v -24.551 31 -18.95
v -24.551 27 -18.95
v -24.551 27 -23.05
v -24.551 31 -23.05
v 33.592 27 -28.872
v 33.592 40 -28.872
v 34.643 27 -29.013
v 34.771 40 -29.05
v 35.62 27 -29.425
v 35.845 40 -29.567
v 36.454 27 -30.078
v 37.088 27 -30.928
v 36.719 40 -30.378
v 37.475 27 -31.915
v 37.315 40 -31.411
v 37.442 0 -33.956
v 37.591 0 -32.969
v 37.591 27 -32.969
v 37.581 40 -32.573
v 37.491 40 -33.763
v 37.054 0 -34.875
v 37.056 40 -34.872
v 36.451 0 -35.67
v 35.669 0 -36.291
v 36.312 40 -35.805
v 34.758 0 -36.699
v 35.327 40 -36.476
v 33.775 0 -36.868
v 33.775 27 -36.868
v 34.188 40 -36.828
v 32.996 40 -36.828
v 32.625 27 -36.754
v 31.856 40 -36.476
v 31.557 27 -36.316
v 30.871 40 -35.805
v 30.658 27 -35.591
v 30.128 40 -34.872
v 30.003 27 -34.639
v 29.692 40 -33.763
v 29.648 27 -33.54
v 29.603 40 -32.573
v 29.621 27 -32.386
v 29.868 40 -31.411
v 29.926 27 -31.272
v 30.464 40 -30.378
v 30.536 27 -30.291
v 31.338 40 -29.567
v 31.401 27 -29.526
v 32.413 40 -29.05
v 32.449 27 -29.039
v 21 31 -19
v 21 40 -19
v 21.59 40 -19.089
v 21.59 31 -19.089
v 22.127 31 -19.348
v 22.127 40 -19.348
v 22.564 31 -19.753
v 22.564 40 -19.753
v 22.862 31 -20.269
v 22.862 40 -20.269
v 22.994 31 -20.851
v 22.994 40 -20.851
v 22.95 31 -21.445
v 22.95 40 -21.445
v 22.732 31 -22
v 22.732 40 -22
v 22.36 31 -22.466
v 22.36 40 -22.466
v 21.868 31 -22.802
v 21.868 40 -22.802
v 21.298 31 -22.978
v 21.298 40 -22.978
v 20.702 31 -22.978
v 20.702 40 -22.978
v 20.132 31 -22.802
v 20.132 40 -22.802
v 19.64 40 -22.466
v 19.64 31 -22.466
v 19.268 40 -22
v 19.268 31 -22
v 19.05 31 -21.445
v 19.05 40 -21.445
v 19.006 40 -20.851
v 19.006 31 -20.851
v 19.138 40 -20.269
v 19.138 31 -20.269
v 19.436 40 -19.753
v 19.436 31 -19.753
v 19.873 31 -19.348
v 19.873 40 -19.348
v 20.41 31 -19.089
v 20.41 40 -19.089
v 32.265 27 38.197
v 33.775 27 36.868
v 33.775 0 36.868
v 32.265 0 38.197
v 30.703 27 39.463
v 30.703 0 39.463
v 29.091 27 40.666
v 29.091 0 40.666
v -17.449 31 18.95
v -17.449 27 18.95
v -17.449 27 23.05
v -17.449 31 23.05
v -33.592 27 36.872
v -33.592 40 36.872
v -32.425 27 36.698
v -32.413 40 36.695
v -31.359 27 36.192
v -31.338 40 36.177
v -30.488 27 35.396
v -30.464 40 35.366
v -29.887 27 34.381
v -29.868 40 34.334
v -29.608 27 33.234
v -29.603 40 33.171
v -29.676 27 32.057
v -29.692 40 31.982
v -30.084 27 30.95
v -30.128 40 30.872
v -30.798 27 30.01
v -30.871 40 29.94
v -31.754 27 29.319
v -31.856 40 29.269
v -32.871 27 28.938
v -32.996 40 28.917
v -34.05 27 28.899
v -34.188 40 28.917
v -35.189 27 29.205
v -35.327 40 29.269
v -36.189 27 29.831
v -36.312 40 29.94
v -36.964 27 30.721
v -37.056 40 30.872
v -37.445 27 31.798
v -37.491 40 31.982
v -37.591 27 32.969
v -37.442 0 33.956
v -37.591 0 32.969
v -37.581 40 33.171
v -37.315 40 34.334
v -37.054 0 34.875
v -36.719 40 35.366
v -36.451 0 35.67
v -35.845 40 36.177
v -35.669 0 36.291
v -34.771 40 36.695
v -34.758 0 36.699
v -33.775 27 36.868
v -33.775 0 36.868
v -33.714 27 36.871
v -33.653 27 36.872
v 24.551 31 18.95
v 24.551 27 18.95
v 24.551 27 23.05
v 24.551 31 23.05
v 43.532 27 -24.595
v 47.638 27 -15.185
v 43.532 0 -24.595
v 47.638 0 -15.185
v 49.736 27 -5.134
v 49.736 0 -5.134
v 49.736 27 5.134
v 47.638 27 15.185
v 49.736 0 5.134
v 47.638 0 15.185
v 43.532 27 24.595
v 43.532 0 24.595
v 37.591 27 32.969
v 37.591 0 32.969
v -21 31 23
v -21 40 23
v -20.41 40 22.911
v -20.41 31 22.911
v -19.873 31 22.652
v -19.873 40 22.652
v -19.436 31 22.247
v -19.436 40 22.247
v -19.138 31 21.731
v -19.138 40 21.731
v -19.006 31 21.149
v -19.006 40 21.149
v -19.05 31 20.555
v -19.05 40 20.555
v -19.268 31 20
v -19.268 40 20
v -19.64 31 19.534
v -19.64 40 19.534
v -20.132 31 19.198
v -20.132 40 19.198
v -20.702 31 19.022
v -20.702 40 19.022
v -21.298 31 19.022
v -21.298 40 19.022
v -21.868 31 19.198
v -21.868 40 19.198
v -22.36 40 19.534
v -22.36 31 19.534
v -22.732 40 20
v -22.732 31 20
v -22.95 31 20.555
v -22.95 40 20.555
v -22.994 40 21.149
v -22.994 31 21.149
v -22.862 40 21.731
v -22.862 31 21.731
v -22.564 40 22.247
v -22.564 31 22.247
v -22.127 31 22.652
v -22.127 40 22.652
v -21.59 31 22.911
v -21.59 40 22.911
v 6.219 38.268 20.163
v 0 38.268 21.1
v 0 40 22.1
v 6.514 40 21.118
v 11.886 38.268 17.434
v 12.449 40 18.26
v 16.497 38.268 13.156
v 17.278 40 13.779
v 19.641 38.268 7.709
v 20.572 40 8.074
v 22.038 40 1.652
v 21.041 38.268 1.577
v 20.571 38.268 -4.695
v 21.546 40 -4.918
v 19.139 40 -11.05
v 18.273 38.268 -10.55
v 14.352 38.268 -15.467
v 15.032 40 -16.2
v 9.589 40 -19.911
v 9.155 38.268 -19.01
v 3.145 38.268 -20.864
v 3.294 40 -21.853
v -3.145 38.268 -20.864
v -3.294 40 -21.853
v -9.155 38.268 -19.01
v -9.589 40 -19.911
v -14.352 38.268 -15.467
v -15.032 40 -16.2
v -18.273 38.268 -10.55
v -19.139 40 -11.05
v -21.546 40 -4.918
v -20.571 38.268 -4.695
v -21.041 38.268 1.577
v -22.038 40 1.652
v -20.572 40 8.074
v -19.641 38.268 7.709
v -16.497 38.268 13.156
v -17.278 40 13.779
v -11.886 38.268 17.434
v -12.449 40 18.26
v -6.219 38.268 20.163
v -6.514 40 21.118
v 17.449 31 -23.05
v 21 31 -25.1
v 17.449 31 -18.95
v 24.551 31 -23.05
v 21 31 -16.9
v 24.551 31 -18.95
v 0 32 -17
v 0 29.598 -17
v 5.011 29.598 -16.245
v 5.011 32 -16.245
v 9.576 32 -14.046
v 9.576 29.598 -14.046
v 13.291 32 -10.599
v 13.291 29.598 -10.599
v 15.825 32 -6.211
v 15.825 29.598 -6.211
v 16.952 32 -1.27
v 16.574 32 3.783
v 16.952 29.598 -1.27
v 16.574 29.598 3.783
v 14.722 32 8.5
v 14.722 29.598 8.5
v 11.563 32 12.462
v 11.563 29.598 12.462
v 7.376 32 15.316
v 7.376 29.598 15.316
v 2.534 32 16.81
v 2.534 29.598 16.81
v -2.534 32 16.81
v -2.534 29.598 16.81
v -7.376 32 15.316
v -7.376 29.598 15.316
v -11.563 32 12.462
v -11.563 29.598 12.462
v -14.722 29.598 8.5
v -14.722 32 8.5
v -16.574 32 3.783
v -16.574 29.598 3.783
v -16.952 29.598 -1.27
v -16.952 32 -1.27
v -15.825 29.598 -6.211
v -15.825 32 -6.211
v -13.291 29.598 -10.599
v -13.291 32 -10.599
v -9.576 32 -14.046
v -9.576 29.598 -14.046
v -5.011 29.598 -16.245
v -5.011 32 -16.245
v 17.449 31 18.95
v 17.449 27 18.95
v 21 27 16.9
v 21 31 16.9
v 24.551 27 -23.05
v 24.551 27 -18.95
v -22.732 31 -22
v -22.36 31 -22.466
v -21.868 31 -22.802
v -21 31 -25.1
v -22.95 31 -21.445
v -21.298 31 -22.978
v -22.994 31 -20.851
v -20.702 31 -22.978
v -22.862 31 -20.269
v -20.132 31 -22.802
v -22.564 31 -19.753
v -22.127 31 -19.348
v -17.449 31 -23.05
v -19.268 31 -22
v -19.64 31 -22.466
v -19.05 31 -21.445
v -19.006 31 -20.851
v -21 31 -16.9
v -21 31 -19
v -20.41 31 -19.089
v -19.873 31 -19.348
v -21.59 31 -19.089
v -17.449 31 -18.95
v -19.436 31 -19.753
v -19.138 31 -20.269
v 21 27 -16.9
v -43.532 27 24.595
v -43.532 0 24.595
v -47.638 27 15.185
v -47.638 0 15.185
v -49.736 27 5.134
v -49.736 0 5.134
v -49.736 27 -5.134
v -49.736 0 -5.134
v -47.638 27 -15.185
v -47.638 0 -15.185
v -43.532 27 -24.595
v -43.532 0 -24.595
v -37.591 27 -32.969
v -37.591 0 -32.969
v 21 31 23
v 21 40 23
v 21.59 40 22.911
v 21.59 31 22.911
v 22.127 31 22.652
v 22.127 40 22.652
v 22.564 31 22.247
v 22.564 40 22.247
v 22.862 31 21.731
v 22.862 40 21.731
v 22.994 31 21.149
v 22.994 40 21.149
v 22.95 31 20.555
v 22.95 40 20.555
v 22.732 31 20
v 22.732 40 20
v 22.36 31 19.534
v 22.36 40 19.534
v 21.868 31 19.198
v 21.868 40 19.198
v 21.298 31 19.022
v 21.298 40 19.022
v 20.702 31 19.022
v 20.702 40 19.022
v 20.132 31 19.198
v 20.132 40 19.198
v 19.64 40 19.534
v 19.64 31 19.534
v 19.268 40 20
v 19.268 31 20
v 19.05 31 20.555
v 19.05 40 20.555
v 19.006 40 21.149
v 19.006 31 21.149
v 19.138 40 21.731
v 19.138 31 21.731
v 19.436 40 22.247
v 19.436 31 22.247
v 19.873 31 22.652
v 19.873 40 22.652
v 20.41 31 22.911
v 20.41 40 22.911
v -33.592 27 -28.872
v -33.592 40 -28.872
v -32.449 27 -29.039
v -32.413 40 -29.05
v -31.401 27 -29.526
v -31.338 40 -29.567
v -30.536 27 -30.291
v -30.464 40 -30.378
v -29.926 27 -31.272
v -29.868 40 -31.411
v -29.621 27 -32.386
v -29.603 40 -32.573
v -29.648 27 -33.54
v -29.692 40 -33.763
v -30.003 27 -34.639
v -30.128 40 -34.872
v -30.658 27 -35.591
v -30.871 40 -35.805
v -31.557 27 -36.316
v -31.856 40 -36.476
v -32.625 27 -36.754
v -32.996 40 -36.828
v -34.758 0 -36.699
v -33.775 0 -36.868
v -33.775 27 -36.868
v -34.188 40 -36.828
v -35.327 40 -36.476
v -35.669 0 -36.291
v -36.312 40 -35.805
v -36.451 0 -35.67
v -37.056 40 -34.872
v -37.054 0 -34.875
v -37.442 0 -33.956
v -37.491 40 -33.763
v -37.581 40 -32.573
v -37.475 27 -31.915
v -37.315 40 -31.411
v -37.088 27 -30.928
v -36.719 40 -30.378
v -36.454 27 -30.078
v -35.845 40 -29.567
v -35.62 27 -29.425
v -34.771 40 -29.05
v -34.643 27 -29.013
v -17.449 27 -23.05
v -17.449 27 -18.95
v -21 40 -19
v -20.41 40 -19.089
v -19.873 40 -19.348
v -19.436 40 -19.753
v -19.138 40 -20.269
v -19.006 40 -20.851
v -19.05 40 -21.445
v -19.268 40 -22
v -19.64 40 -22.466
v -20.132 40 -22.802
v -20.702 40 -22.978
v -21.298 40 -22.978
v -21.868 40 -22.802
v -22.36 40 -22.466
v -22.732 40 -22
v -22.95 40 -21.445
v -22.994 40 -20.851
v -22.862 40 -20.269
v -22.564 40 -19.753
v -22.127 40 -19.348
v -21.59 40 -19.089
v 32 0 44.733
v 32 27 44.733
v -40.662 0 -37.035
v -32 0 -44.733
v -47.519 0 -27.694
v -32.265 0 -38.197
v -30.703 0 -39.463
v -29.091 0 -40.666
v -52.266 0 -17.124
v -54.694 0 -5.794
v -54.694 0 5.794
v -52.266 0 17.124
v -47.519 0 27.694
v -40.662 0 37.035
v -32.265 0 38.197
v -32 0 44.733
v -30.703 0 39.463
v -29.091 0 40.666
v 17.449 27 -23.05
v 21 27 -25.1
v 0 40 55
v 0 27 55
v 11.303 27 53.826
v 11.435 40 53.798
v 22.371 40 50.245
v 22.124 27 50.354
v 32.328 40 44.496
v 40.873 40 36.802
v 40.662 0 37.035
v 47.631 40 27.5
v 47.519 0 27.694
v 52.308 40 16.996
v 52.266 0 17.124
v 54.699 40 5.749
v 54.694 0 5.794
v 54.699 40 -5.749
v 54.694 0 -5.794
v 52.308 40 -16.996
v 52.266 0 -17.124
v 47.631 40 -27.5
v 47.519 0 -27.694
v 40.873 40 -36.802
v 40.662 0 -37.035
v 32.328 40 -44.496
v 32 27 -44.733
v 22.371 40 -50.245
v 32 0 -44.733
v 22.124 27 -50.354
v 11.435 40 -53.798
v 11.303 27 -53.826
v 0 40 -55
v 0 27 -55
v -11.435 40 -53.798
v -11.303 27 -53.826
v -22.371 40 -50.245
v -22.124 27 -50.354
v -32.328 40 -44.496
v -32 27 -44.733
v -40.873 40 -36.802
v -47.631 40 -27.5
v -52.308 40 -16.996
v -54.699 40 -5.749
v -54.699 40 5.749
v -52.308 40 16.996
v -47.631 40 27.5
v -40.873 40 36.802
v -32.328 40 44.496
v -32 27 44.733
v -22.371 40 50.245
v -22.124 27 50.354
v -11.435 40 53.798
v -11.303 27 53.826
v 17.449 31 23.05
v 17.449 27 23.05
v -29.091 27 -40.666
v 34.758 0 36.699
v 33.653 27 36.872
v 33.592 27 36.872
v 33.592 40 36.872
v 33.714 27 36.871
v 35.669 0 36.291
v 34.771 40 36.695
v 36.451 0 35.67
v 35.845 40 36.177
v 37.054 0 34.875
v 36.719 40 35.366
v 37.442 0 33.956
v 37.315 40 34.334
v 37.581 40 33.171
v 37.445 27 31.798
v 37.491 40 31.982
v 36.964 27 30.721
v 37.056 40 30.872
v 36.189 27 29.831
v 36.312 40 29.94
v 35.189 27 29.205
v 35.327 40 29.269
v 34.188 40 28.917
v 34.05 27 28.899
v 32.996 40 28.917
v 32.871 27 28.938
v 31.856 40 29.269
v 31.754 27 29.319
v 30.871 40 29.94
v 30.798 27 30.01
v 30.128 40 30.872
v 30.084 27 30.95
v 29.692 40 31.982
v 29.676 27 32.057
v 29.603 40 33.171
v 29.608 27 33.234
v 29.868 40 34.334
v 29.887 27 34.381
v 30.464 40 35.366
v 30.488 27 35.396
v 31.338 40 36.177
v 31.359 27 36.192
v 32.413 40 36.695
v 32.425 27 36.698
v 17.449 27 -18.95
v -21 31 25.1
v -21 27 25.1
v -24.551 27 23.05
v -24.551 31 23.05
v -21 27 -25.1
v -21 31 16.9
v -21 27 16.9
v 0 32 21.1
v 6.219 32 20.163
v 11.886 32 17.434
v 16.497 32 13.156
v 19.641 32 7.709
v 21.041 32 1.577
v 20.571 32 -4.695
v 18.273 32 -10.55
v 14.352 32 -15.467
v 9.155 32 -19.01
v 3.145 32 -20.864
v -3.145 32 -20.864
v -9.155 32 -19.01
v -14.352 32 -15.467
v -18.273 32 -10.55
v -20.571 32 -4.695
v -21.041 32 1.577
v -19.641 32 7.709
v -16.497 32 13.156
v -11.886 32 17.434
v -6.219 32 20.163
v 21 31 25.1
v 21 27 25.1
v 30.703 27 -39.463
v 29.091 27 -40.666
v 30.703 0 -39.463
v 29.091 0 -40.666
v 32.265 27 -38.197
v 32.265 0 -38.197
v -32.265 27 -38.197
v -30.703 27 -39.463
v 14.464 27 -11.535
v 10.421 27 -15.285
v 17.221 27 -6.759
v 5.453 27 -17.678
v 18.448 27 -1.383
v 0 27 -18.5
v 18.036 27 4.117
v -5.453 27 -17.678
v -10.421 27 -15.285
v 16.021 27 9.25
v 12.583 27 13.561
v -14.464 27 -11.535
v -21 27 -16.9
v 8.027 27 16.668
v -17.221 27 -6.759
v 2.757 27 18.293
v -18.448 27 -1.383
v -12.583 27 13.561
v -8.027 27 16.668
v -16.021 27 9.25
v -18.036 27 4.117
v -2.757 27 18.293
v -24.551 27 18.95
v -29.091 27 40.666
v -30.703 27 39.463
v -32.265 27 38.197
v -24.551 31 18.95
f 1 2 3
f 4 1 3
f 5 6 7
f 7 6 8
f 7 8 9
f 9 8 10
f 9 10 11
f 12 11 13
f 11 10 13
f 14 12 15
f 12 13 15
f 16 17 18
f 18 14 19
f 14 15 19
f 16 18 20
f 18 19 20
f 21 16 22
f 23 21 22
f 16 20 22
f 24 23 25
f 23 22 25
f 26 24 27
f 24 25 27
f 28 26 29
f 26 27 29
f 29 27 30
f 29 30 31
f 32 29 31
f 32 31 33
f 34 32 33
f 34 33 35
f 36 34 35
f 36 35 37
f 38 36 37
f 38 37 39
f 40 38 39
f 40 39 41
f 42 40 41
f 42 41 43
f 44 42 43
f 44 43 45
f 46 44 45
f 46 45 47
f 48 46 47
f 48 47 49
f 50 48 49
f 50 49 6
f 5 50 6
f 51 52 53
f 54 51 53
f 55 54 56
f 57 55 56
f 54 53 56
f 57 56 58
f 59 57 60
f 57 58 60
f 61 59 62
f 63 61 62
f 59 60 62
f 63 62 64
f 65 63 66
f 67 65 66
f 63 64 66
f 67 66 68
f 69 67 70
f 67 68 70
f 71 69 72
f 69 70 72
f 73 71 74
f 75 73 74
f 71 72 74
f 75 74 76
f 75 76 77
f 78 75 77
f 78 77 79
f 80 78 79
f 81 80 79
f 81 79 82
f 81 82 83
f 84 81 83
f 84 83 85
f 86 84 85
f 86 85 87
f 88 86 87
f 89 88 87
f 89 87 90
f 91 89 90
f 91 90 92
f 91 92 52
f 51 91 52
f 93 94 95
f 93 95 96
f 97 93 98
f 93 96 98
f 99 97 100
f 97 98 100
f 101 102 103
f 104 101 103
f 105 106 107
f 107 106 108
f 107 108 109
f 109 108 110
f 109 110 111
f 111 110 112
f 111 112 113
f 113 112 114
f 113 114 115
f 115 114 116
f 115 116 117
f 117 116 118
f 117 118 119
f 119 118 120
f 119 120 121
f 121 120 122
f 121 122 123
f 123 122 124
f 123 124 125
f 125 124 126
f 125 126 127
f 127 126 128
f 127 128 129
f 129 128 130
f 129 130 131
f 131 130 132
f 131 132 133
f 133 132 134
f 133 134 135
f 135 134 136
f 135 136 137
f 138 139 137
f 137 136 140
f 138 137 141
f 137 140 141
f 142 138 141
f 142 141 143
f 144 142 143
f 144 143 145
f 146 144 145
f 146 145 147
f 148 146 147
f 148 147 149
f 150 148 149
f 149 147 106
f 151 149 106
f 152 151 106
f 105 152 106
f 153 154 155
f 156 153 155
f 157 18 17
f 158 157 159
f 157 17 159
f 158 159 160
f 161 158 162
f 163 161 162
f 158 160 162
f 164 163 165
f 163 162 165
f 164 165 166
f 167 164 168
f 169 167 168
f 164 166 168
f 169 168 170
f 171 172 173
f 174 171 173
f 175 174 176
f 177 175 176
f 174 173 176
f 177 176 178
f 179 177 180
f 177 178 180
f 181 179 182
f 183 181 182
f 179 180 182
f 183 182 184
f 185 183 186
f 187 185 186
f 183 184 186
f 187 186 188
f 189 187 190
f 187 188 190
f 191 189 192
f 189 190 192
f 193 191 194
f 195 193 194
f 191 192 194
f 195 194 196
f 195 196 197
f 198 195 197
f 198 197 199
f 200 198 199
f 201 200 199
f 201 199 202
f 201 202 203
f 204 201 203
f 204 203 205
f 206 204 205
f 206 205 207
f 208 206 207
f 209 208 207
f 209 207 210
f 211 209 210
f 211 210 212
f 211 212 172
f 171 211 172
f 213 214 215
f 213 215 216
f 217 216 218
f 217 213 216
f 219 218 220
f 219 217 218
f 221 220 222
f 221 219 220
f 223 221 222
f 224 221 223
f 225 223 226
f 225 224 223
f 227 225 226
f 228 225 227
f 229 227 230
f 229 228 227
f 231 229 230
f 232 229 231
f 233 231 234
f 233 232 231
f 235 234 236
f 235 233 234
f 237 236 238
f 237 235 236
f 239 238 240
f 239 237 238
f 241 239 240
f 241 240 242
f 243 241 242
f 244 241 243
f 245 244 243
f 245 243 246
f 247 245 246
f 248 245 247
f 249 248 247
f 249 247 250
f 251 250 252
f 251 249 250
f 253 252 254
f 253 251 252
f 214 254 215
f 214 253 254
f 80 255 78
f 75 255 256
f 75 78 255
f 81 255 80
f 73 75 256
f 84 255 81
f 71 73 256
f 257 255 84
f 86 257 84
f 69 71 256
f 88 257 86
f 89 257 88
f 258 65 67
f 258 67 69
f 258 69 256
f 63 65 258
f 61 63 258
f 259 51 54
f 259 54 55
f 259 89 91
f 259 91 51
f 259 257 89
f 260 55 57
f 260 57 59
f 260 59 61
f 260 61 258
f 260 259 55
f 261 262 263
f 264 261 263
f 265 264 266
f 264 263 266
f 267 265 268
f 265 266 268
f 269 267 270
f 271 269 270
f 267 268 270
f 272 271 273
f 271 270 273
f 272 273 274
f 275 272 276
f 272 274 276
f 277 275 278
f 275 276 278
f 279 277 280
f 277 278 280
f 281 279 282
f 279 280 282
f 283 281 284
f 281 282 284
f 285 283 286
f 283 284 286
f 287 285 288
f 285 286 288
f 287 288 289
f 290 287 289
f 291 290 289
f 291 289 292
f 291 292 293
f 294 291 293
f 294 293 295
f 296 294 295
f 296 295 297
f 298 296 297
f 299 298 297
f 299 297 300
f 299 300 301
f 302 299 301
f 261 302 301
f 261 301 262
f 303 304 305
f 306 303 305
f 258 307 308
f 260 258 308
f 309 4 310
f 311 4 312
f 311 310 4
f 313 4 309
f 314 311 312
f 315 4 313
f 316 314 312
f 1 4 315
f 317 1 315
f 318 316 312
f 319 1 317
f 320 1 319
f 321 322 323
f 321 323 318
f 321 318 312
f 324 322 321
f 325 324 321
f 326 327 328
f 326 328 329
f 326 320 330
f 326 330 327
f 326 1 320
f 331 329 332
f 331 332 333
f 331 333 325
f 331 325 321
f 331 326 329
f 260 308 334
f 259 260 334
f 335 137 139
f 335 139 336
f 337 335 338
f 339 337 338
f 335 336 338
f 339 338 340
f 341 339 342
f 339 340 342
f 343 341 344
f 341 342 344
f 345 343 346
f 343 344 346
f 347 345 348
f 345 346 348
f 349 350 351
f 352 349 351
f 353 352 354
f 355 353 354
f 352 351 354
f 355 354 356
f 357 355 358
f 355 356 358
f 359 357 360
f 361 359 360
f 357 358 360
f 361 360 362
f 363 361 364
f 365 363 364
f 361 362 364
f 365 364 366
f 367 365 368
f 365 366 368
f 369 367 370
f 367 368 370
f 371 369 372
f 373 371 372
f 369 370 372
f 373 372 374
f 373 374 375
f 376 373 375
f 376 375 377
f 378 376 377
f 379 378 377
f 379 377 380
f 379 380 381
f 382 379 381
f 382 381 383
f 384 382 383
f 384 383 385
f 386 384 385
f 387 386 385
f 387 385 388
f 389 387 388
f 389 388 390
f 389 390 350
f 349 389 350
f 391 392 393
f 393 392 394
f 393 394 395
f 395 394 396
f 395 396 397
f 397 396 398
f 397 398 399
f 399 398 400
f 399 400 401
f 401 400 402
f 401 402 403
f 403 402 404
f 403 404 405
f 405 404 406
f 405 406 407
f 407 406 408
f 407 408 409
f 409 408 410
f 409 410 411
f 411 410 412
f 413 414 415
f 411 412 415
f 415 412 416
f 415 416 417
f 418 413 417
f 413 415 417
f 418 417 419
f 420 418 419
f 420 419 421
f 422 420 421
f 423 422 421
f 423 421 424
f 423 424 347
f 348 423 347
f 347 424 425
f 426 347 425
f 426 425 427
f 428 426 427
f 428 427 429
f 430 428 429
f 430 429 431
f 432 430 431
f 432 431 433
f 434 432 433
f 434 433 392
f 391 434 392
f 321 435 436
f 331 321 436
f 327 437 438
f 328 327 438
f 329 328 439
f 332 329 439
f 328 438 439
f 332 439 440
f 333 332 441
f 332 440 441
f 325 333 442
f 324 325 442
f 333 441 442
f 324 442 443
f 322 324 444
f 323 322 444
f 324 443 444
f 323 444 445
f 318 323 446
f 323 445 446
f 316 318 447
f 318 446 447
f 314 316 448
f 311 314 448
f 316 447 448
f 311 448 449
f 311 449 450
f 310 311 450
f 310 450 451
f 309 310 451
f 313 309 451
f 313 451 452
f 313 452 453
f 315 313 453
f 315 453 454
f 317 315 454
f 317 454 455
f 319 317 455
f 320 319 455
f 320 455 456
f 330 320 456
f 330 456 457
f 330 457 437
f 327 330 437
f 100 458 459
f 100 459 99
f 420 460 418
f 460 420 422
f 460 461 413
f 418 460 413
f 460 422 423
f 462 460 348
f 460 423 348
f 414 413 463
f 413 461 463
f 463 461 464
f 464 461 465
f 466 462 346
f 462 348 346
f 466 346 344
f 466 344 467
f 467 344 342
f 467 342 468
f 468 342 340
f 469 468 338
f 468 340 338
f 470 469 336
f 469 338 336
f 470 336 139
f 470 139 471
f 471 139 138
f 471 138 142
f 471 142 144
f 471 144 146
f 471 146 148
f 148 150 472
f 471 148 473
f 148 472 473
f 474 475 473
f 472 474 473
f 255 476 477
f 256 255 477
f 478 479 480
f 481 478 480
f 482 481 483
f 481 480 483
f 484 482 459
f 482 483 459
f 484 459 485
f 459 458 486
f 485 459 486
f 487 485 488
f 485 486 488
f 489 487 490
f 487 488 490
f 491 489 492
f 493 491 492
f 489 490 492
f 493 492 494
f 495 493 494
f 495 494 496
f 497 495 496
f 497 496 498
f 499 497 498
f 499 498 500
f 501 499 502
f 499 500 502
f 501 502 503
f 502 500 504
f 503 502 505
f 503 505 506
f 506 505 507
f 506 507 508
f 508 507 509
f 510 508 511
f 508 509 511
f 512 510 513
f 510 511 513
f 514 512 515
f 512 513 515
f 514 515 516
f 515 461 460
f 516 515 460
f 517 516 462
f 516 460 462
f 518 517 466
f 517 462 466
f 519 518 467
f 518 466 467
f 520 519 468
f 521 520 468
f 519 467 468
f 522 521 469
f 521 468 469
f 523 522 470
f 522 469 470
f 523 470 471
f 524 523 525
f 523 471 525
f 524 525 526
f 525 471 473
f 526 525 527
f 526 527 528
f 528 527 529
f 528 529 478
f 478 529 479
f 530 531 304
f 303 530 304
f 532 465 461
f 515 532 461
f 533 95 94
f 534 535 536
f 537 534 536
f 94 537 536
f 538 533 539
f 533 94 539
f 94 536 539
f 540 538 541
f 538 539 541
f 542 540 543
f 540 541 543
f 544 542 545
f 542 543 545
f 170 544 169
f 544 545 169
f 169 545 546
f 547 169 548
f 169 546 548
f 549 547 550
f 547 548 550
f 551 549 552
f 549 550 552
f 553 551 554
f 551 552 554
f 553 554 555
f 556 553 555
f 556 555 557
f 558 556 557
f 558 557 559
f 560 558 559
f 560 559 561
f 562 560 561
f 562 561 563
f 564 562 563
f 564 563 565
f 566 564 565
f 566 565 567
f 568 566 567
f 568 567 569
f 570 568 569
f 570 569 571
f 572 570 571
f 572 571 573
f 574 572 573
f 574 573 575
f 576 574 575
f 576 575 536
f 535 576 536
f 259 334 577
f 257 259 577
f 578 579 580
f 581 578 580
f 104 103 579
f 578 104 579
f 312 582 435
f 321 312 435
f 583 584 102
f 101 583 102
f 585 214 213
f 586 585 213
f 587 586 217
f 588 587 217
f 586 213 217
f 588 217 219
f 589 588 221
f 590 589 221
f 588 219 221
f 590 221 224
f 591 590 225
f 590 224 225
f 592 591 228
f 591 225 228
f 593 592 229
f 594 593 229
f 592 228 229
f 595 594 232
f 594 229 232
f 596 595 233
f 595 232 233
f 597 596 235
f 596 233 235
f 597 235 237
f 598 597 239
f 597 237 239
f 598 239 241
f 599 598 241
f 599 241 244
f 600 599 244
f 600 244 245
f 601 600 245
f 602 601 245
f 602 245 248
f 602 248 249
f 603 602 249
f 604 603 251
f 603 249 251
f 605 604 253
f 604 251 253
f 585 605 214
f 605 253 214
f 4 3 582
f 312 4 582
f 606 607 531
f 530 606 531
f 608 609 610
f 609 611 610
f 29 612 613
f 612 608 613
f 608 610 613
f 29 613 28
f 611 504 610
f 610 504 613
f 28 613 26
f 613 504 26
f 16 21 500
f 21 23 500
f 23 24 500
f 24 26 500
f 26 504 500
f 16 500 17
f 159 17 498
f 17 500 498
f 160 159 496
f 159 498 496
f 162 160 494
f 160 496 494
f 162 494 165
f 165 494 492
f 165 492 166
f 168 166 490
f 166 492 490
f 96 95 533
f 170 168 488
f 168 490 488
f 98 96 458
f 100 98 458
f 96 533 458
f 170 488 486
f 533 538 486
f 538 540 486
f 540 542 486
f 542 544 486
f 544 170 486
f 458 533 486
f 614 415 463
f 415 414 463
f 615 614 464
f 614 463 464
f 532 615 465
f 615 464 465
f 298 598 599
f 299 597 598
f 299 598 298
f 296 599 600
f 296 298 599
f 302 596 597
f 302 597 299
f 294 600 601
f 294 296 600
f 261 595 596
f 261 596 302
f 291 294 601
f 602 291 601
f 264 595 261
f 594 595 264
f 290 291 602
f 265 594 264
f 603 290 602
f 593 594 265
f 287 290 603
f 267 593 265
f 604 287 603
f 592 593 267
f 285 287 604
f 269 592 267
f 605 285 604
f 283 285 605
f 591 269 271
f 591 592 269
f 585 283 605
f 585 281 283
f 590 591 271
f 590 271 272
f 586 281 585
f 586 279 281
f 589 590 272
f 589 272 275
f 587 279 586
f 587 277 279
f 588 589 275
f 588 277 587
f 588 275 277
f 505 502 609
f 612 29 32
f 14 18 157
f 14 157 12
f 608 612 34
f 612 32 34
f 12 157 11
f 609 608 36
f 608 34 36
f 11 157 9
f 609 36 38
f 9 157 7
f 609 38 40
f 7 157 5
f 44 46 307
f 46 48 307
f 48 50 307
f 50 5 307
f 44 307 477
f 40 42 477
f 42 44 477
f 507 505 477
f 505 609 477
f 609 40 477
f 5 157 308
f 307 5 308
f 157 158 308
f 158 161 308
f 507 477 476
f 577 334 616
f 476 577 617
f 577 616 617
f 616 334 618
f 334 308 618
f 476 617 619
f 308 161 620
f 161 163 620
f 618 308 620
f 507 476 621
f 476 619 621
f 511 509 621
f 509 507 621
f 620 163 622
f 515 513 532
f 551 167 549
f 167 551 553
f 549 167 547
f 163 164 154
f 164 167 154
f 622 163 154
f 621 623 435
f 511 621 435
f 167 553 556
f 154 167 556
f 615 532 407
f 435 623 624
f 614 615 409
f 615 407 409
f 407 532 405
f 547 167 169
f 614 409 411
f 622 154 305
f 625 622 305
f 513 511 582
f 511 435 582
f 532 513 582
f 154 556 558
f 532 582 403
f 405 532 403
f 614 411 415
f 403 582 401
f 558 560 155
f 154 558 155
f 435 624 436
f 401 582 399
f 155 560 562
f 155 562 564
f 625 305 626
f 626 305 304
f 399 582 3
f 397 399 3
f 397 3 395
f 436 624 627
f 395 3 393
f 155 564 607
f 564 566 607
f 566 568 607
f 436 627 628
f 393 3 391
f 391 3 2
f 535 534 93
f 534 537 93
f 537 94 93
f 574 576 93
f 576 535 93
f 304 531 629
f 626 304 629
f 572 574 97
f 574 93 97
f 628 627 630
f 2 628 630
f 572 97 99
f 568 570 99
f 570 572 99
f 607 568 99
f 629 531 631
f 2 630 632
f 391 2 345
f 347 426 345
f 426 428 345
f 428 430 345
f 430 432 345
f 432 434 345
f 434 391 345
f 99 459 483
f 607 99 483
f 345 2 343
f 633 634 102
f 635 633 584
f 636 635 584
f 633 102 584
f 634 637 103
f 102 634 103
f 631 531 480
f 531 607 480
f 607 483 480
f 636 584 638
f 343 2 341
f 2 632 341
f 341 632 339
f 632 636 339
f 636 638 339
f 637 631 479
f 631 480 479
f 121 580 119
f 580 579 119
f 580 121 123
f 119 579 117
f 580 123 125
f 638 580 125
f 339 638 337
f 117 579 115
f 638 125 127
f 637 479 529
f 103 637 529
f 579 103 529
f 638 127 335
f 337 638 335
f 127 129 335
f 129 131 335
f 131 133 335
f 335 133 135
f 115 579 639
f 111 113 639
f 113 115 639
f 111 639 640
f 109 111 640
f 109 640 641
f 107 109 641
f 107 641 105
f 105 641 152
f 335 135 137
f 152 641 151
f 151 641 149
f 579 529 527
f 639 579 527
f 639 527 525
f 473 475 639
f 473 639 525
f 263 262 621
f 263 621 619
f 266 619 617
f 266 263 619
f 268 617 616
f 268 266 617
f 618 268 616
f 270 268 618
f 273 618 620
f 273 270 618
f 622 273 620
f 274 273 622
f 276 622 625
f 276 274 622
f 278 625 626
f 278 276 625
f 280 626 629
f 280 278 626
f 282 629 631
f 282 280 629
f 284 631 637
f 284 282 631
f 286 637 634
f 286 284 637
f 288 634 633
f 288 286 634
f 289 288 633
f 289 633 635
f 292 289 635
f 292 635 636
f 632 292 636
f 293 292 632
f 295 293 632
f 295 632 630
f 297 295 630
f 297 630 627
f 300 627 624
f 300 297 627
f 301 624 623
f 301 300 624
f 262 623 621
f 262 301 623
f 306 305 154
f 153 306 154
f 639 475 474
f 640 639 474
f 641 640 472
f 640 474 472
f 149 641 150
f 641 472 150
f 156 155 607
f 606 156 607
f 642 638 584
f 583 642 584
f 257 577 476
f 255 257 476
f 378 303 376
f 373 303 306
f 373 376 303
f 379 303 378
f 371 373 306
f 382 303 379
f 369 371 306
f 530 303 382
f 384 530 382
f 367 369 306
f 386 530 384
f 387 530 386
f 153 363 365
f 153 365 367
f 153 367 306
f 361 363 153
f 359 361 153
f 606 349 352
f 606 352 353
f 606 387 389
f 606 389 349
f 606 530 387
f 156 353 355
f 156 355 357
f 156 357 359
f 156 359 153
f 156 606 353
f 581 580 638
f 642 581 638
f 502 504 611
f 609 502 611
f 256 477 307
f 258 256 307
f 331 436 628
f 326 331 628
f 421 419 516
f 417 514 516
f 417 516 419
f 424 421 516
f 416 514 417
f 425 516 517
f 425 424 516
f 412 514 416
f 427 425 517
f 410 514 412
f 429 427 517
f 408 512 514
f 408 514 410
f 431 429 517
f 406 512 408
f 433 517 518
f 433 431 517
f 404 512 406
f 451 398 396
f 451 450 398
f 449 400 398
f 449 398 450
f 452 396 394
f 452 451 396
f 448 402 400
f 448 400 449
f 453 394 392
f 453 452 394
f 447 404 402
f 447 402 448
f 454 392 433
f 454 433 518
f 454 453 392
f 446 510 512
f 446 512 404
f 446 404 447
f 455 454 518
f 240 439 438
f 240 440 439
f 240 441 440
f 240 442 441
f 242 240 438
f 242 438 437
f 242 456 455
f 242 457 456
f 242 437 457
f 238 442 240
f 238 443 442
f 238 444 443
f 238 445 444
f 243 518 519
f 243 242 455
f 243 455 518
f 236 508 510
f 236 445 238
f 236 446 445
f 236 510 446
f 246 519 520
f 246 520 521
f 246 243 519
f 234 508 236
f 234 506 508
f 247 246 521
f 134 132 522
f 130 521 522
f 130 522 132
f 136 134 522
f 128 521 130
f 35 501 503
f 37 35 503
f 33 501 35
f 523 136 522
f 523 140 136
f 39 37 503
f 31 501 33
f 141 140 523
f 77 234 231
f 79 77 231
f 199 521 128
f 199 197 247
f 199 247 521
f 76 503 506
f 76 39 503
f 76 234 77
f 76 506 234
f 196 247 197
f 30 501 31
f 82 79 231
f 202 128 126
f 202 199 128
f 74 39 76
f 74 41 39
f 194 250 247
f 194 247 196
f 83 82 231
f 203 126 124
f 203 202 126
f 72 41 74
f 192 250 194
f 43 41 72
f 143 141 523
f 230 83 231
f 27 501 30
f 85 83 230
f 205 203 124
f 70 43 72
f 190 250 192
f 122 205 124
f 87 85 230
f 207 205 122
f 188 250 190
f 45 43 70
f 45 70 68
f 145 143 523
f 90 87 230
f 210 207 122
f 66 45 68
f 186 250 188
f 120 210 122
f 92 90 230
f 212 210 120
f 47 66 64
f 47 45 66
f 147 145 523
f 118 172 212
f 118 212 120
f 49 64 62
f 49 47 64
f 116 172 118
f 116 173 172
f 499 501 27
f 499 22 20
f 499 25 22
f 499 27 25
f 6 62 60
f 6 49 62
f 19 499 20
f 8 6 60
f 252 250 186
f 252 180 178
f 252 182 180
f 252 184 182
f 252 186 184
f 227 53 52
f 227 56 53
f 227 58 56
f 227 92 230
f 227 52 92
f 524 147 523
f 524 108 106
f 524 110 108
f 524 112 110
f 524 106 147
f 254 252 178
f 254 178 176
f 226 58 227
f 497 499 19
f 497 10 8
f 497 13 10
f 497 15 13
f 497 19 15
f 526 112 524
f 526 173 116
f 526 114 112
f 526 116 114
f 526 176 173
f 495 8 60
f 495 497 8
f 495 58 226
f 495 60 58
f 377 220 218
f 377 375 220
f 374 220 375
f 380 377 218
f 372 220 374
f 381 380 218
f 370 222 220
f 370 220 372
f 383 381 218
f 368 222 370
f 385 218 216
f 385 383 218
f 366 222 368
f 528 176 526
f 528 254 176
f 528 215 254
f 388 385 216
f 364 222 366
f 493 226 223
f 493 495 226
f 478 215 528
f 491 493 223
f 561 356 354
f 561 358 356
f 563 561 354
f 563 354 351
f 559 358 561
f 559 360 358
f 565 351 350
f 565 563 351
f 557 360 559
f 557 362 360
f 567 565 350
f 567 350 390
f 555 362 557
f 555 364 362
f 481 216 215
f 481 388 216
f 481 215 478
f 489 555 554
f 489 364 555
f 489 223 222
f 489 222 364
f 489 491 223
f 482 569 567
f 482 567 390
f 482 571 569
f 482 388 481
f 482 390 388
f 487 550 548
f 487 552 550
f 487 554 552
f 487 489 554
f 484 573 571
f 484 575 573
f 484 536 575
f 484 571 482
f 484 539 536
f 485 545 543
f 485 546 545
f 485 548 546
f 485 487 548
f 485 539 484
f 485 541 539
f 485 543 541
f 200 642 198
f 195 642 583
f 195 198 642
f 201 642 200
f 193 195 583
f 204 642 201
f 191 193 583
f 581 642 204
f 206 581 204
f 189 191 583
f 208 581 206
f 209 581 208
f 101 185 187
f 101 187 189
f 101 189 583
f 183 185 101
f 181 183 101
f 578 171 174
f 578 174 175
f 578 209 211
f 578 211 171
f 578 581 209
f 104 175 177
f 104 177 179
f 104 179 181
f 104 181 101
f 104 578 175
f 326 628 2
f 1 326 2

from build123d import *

# Parameters (mm, degrees)
SKETCH_1_R          = 55
EXTRUDE_1_DEPTH     = 40
SKETCH_2_R          = 50
CUT_EXTRUDE_1_DEPTH = 27
SKETCH_3_R          = 17
CUT_EXTRUDE_2_DEPTH = 14
SKETCH_4_R          = 4
CUT_EXTRUDE_3_DEPTH = 41
SKETCH1_R           = 21.1
CUT_EXTRUDE1_DEPTH  = 8
CHAMFER1_SIZE       = 1
CHAMFER1_SIZE2      = 1.732050808
SKETCH2_R           = 2
CUT_EXTRUDE2_DEPTH  = 41
CUT_EXTRUDE3_DEPTH  = 4
CUT_EXTRUDE4_DEPTH  = 27
CHAMFER2_SIZE       = 1.5
CHAMFER2_SIZE2      = 2.598076211


with BuildPart() as part:
    # Эскиз1 → Бобышка-Вытянуть1 (new body)
    with BuildSketch(Plane(origin=(0, 0, 0), x_dir=(1, 0, 0), z_dir=(0, 1, 0))):
        with Locations(Location((0, 0, 0), (0, 0, 270))):  # turned: the seam where the file's is
            Circle(SKETCH_1_R)
    extrude(amount=EXTRUDE_1_DEPTH)

    # Эскиз2 → Вырез-Вытянуть1 (cut)
    with BuildSketch(Plane.XZ):
        with Locations(Location((0, 0, 0), (0, 0, 270))):  # turned: the seam where the file's is
            Circle(SKETCH_2_R)
    extrude(amount=-CUT_EXTRUDE_1_DEPTH, mode=Mode.SUBTRACT)

    # Эскиз3 → Вырез-Вытянуть2 (cut, through all)
    with BuildSketch(Plane.XZ.offset(-27)):
        with Locations(Location((0, 0, 0), (0, 0, 270))):  # turned: the seam where the file's is
            Circle(SKETCH_3_R)
    extrude(amount=-CUT_EXTRUDE_2_DEPTH, mode=Mode.SUBTRACT)

    # Эскиз4 → Вырез-Вытянуть3 (cut, through all)
    with BuildSketch(Plane(origin=(0, 40, 0), x_dir=(1, 0, 0), z_dir=(0, 1, 0))):
        with Locations(Location((33.591727056, -32.872418125, 0), (0, 0, 270))):  # turned: the seam where the file's is
            Circle(SKETCH_4_R)
        with Locations(Location((-33.591727056, -32.872418125, 0), (0, 0, 270))):  # turned: the seam where the file's is
            Circle(SKETCH_4_R)
        with Locations(Location((-33.591727056, 32.872418125, 0), (0, 0, 270))):  # turned: the seam where the file's is
            Circle(SKETCH_4_R)
        with Locations(Location((33.591727056, 32.872418125, 0), (0, 0, 270))):  # turned: the seam where the file's is
            Circle(SKETCH_4_R)
    extrude(amount=-CUT_EXTRUDE_3_DEPTH, mode=Mode.SUBTRACT)

    # Sketch1 → Cut-Extrude1 (cut)
    with BuildSketch(Plane(origin=(0, 40, 0), x_dir=(1, 0, 0), z_dir=(0, 1, 0))):
        with Locations(Location((0, 0, 0), (0, 0, 270))):  # turned: the seam where the file's is
            Circle(SKETCH1_R)
    extrude(amount=-CUT_EXTRUDE1_DEPTH, mode=Mode.SUBTRACT)

    # Chamfer1
    chamfer1_edges = [part.edges().sort_by_distance(p)[0] for p in [
        (0, 40, -21.1),
    ]]
    chamfer1_side = [part.faces().sort_by_distance(p)[0] for p in [
        (0, 40, -53.444365081),
    ]]
    chamfer(chamfer1_edges, length=CHAMFER1_SIZE, length2=CHAMFER1_SIZE2, reference=chamfer1_side[0])

    # Sketch2 → Cut-Extrude2 (cut, through all)
    with BuildSketch(Plane(origin=(0, 40, 0), x_dir=(1, 0, 0), z_dir=(0, 1, 0))):
        with Locations(Location((21, 21, 0), (0, 0, 270))):  # turned: the seam where the file's is
            Circle(SKETCH2_R)
        with Locations(Location((-21, 21, 0), (0, 0, 270))):  # turned: the seam where the file's is
            Circle(SKETCH2_R)
        with Locations(Location((21, -21, 0), (0, 0, 270))):  # turned: the seam where the file's is
            Circle(SKETCH2_R)
        with Locations(Location((-21, -21, 0), (0, 0, 270))):  # turned: the seam where the file's is
            Circle(SKETCH2_R)
    extrude(amount=-CUT_EXTRUDE2_DEPTH, mode=Mode.SUBTRACT)

    # Sketch3 → Cut-Extrude3 (cut)
    with BuildSketch(Plane.XZ.offset(-27)):
        Polygon((-21, -16.9), (-24.550704156, -18.95), (-24.550704156, -23.05), (-21, -25.1), (-17.449295844, -23.05), (-17.449295844, -18.95), align=None)
        Polygon((-21, 25.1), (-24.550704156, 23.05), (-24.550704156, 18.95), (-21, 16.9), (-17.449295844, 18.95), (-17.449295844, 23.05), align=None)
        Polygon((24.550704156, 23.05), (21, 25.1), (17.449295844, 23.05), (17.449295844, 18.95), (21, 16.9), (24.550704156, 18.95), align=None)
        Polygon((24.550704156, -18.95), (21, -16.9), (17.449295844, -18.95), (17.449295844, -23.05), (21, -25.1), (24.550704156, -23.05), align=None)
    extrude(amount=-CUT_EXTRUDE3_DEPTH, mode=Mode.SUBTRACT)

    # Sketch4 → Cut-Extrude4 (cut)
    with BuildSketch(Plane.XZ):
        with BuildLine():
            Line((32, -44.732538493), (29.090909091, -40.665944084))
            ThreePointArc((29.090909091, -40.665944084), (0, -50), (-29.090909091, -40.665944084))
            Line((-29.090909091, -40.665944084), (-32, -44.732538493))
            ThreePointArc((-32, -44.732538493), (0, -55), (32, -44.732538493))
        make_face()
        with BuildLine():
            Line((32, 44.732538493), (29.090909091, 40.665944084))
            ThreePointArc((29.090909091, 40.665944084), (0, 50), (-29.090909091, 40.665944084))
            Line((-29.090909091, 40.665944084), (-32, 44.732538493))
            ThreePointArc((-32, 44.732538493), (0, 55), (32, 44.732538493))
        make_face()
    extrude(amount=-CUT_EXTRUDE4_DEPTH, mode=Mode.SUBTRACT)

    # Chamfer2
    chamfer2_edges = [part.edges().sort_by_distance(p)[0] for p in [
        (0, 27, 17),
    ]]
    chamfer2_side = [part.faces().sort_by_distance(p)[0] for p in [
        (29.336369105, 27, 43.564176197),
    ]]
    chamfer(chamfer2_edges, length=CHAMFER2_SIZE, length2=CHAMFER2_SIZE2, reference=chamfer2_side[0])


solid = part.part
